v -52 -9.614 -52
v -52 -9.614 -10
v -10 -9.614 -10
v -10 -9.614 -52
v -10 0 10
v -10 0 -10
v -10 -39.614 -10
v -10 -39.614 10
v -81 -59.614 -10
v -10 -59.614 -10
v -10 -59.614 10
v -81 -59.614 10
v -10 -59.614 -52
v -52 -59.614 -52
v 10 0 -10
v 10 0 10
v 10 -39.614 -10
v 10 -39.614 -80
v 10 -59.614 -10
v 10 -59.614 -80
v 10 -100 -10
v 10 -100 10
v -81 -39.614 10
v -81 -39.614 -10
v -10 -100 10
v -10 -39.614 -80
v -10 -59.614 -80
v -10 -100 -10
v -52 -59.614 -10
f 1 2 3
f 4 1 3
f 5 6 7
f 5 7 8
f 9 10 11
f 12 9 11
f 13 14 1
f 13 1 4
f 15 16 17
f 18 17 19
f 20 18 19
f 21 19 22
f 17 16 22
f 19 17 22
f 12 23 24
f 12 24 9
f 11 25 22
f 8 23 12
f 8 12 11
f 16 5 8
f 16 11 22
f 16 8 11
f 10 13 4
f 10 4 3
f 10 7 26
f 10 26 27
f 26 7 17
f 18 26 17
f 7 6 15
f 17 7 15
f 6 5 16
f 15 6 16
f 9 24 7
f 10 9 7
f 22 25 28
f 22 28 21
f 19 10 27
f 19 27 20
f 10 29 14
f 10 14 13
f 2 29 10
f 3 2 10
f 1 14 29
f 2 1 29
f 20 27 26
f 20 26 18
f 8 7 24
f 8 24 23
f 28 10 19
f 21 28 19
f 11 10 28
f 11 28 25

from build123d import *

# Parameters (mm, degrees)
F0_W     = 20
F0_H     = 20
F1_DEPTH = 100
F2_W     = 20
F2_H     = 20
F3_DEPTH = 71
F4_W     = 20
F4_H     = 20
F5_DEPTH = 70
F7_W     = 42
F7_H     = 42
F7_R     = 13.107591
F8_DEPTH = 50


with BuildPart() as f1:
    # F0 (on Front) → F1 (new body)
    with BuildSketch(Plane.XZ):
        Rectangle(F0_W, F0_H)
    extrude(amount=F1_DEPTH)

    # F2 (on face) → F3 (join)
    with BuildSketch(Plane(origin=(-10, 0, 0), x_dir=(0, -1, 0), z_dir=(-1, 0, 0))):
        with Locations((49.614405, 0)):
            Rectangle(F2_W, F2_H)
    extrude(amount=F3_DEPTH)

    # F4 (on face) → F5 (join)
    with BuildSketch(Plane(origin=(0, 0, -10), x_dir=(1, 0, 0), z_dir=(0, 0, -1))):
        with Locations((0, 49.614405)):
            Rectangle(F4_W, F4_H)
    extrude(amount=F5_DEPTH)


with BuildPart() as f8:
    # F7 (on face) → F8 (new body)
    with BuildSketch(Plane.XZ.offset(59.614405)):
        with Locations((-31, -31)):
            Rectangle(F7_W, F7_H)
        with Locations((-31, -31)):
            Circle(F7_R, mode=Mode.SUBTRACT)
        with Locations((-31, -31)):
            Circle(F7_R)
    extrude(amount=-F8_DEPTH)


solid = Compound([f1.part, f8.part])
